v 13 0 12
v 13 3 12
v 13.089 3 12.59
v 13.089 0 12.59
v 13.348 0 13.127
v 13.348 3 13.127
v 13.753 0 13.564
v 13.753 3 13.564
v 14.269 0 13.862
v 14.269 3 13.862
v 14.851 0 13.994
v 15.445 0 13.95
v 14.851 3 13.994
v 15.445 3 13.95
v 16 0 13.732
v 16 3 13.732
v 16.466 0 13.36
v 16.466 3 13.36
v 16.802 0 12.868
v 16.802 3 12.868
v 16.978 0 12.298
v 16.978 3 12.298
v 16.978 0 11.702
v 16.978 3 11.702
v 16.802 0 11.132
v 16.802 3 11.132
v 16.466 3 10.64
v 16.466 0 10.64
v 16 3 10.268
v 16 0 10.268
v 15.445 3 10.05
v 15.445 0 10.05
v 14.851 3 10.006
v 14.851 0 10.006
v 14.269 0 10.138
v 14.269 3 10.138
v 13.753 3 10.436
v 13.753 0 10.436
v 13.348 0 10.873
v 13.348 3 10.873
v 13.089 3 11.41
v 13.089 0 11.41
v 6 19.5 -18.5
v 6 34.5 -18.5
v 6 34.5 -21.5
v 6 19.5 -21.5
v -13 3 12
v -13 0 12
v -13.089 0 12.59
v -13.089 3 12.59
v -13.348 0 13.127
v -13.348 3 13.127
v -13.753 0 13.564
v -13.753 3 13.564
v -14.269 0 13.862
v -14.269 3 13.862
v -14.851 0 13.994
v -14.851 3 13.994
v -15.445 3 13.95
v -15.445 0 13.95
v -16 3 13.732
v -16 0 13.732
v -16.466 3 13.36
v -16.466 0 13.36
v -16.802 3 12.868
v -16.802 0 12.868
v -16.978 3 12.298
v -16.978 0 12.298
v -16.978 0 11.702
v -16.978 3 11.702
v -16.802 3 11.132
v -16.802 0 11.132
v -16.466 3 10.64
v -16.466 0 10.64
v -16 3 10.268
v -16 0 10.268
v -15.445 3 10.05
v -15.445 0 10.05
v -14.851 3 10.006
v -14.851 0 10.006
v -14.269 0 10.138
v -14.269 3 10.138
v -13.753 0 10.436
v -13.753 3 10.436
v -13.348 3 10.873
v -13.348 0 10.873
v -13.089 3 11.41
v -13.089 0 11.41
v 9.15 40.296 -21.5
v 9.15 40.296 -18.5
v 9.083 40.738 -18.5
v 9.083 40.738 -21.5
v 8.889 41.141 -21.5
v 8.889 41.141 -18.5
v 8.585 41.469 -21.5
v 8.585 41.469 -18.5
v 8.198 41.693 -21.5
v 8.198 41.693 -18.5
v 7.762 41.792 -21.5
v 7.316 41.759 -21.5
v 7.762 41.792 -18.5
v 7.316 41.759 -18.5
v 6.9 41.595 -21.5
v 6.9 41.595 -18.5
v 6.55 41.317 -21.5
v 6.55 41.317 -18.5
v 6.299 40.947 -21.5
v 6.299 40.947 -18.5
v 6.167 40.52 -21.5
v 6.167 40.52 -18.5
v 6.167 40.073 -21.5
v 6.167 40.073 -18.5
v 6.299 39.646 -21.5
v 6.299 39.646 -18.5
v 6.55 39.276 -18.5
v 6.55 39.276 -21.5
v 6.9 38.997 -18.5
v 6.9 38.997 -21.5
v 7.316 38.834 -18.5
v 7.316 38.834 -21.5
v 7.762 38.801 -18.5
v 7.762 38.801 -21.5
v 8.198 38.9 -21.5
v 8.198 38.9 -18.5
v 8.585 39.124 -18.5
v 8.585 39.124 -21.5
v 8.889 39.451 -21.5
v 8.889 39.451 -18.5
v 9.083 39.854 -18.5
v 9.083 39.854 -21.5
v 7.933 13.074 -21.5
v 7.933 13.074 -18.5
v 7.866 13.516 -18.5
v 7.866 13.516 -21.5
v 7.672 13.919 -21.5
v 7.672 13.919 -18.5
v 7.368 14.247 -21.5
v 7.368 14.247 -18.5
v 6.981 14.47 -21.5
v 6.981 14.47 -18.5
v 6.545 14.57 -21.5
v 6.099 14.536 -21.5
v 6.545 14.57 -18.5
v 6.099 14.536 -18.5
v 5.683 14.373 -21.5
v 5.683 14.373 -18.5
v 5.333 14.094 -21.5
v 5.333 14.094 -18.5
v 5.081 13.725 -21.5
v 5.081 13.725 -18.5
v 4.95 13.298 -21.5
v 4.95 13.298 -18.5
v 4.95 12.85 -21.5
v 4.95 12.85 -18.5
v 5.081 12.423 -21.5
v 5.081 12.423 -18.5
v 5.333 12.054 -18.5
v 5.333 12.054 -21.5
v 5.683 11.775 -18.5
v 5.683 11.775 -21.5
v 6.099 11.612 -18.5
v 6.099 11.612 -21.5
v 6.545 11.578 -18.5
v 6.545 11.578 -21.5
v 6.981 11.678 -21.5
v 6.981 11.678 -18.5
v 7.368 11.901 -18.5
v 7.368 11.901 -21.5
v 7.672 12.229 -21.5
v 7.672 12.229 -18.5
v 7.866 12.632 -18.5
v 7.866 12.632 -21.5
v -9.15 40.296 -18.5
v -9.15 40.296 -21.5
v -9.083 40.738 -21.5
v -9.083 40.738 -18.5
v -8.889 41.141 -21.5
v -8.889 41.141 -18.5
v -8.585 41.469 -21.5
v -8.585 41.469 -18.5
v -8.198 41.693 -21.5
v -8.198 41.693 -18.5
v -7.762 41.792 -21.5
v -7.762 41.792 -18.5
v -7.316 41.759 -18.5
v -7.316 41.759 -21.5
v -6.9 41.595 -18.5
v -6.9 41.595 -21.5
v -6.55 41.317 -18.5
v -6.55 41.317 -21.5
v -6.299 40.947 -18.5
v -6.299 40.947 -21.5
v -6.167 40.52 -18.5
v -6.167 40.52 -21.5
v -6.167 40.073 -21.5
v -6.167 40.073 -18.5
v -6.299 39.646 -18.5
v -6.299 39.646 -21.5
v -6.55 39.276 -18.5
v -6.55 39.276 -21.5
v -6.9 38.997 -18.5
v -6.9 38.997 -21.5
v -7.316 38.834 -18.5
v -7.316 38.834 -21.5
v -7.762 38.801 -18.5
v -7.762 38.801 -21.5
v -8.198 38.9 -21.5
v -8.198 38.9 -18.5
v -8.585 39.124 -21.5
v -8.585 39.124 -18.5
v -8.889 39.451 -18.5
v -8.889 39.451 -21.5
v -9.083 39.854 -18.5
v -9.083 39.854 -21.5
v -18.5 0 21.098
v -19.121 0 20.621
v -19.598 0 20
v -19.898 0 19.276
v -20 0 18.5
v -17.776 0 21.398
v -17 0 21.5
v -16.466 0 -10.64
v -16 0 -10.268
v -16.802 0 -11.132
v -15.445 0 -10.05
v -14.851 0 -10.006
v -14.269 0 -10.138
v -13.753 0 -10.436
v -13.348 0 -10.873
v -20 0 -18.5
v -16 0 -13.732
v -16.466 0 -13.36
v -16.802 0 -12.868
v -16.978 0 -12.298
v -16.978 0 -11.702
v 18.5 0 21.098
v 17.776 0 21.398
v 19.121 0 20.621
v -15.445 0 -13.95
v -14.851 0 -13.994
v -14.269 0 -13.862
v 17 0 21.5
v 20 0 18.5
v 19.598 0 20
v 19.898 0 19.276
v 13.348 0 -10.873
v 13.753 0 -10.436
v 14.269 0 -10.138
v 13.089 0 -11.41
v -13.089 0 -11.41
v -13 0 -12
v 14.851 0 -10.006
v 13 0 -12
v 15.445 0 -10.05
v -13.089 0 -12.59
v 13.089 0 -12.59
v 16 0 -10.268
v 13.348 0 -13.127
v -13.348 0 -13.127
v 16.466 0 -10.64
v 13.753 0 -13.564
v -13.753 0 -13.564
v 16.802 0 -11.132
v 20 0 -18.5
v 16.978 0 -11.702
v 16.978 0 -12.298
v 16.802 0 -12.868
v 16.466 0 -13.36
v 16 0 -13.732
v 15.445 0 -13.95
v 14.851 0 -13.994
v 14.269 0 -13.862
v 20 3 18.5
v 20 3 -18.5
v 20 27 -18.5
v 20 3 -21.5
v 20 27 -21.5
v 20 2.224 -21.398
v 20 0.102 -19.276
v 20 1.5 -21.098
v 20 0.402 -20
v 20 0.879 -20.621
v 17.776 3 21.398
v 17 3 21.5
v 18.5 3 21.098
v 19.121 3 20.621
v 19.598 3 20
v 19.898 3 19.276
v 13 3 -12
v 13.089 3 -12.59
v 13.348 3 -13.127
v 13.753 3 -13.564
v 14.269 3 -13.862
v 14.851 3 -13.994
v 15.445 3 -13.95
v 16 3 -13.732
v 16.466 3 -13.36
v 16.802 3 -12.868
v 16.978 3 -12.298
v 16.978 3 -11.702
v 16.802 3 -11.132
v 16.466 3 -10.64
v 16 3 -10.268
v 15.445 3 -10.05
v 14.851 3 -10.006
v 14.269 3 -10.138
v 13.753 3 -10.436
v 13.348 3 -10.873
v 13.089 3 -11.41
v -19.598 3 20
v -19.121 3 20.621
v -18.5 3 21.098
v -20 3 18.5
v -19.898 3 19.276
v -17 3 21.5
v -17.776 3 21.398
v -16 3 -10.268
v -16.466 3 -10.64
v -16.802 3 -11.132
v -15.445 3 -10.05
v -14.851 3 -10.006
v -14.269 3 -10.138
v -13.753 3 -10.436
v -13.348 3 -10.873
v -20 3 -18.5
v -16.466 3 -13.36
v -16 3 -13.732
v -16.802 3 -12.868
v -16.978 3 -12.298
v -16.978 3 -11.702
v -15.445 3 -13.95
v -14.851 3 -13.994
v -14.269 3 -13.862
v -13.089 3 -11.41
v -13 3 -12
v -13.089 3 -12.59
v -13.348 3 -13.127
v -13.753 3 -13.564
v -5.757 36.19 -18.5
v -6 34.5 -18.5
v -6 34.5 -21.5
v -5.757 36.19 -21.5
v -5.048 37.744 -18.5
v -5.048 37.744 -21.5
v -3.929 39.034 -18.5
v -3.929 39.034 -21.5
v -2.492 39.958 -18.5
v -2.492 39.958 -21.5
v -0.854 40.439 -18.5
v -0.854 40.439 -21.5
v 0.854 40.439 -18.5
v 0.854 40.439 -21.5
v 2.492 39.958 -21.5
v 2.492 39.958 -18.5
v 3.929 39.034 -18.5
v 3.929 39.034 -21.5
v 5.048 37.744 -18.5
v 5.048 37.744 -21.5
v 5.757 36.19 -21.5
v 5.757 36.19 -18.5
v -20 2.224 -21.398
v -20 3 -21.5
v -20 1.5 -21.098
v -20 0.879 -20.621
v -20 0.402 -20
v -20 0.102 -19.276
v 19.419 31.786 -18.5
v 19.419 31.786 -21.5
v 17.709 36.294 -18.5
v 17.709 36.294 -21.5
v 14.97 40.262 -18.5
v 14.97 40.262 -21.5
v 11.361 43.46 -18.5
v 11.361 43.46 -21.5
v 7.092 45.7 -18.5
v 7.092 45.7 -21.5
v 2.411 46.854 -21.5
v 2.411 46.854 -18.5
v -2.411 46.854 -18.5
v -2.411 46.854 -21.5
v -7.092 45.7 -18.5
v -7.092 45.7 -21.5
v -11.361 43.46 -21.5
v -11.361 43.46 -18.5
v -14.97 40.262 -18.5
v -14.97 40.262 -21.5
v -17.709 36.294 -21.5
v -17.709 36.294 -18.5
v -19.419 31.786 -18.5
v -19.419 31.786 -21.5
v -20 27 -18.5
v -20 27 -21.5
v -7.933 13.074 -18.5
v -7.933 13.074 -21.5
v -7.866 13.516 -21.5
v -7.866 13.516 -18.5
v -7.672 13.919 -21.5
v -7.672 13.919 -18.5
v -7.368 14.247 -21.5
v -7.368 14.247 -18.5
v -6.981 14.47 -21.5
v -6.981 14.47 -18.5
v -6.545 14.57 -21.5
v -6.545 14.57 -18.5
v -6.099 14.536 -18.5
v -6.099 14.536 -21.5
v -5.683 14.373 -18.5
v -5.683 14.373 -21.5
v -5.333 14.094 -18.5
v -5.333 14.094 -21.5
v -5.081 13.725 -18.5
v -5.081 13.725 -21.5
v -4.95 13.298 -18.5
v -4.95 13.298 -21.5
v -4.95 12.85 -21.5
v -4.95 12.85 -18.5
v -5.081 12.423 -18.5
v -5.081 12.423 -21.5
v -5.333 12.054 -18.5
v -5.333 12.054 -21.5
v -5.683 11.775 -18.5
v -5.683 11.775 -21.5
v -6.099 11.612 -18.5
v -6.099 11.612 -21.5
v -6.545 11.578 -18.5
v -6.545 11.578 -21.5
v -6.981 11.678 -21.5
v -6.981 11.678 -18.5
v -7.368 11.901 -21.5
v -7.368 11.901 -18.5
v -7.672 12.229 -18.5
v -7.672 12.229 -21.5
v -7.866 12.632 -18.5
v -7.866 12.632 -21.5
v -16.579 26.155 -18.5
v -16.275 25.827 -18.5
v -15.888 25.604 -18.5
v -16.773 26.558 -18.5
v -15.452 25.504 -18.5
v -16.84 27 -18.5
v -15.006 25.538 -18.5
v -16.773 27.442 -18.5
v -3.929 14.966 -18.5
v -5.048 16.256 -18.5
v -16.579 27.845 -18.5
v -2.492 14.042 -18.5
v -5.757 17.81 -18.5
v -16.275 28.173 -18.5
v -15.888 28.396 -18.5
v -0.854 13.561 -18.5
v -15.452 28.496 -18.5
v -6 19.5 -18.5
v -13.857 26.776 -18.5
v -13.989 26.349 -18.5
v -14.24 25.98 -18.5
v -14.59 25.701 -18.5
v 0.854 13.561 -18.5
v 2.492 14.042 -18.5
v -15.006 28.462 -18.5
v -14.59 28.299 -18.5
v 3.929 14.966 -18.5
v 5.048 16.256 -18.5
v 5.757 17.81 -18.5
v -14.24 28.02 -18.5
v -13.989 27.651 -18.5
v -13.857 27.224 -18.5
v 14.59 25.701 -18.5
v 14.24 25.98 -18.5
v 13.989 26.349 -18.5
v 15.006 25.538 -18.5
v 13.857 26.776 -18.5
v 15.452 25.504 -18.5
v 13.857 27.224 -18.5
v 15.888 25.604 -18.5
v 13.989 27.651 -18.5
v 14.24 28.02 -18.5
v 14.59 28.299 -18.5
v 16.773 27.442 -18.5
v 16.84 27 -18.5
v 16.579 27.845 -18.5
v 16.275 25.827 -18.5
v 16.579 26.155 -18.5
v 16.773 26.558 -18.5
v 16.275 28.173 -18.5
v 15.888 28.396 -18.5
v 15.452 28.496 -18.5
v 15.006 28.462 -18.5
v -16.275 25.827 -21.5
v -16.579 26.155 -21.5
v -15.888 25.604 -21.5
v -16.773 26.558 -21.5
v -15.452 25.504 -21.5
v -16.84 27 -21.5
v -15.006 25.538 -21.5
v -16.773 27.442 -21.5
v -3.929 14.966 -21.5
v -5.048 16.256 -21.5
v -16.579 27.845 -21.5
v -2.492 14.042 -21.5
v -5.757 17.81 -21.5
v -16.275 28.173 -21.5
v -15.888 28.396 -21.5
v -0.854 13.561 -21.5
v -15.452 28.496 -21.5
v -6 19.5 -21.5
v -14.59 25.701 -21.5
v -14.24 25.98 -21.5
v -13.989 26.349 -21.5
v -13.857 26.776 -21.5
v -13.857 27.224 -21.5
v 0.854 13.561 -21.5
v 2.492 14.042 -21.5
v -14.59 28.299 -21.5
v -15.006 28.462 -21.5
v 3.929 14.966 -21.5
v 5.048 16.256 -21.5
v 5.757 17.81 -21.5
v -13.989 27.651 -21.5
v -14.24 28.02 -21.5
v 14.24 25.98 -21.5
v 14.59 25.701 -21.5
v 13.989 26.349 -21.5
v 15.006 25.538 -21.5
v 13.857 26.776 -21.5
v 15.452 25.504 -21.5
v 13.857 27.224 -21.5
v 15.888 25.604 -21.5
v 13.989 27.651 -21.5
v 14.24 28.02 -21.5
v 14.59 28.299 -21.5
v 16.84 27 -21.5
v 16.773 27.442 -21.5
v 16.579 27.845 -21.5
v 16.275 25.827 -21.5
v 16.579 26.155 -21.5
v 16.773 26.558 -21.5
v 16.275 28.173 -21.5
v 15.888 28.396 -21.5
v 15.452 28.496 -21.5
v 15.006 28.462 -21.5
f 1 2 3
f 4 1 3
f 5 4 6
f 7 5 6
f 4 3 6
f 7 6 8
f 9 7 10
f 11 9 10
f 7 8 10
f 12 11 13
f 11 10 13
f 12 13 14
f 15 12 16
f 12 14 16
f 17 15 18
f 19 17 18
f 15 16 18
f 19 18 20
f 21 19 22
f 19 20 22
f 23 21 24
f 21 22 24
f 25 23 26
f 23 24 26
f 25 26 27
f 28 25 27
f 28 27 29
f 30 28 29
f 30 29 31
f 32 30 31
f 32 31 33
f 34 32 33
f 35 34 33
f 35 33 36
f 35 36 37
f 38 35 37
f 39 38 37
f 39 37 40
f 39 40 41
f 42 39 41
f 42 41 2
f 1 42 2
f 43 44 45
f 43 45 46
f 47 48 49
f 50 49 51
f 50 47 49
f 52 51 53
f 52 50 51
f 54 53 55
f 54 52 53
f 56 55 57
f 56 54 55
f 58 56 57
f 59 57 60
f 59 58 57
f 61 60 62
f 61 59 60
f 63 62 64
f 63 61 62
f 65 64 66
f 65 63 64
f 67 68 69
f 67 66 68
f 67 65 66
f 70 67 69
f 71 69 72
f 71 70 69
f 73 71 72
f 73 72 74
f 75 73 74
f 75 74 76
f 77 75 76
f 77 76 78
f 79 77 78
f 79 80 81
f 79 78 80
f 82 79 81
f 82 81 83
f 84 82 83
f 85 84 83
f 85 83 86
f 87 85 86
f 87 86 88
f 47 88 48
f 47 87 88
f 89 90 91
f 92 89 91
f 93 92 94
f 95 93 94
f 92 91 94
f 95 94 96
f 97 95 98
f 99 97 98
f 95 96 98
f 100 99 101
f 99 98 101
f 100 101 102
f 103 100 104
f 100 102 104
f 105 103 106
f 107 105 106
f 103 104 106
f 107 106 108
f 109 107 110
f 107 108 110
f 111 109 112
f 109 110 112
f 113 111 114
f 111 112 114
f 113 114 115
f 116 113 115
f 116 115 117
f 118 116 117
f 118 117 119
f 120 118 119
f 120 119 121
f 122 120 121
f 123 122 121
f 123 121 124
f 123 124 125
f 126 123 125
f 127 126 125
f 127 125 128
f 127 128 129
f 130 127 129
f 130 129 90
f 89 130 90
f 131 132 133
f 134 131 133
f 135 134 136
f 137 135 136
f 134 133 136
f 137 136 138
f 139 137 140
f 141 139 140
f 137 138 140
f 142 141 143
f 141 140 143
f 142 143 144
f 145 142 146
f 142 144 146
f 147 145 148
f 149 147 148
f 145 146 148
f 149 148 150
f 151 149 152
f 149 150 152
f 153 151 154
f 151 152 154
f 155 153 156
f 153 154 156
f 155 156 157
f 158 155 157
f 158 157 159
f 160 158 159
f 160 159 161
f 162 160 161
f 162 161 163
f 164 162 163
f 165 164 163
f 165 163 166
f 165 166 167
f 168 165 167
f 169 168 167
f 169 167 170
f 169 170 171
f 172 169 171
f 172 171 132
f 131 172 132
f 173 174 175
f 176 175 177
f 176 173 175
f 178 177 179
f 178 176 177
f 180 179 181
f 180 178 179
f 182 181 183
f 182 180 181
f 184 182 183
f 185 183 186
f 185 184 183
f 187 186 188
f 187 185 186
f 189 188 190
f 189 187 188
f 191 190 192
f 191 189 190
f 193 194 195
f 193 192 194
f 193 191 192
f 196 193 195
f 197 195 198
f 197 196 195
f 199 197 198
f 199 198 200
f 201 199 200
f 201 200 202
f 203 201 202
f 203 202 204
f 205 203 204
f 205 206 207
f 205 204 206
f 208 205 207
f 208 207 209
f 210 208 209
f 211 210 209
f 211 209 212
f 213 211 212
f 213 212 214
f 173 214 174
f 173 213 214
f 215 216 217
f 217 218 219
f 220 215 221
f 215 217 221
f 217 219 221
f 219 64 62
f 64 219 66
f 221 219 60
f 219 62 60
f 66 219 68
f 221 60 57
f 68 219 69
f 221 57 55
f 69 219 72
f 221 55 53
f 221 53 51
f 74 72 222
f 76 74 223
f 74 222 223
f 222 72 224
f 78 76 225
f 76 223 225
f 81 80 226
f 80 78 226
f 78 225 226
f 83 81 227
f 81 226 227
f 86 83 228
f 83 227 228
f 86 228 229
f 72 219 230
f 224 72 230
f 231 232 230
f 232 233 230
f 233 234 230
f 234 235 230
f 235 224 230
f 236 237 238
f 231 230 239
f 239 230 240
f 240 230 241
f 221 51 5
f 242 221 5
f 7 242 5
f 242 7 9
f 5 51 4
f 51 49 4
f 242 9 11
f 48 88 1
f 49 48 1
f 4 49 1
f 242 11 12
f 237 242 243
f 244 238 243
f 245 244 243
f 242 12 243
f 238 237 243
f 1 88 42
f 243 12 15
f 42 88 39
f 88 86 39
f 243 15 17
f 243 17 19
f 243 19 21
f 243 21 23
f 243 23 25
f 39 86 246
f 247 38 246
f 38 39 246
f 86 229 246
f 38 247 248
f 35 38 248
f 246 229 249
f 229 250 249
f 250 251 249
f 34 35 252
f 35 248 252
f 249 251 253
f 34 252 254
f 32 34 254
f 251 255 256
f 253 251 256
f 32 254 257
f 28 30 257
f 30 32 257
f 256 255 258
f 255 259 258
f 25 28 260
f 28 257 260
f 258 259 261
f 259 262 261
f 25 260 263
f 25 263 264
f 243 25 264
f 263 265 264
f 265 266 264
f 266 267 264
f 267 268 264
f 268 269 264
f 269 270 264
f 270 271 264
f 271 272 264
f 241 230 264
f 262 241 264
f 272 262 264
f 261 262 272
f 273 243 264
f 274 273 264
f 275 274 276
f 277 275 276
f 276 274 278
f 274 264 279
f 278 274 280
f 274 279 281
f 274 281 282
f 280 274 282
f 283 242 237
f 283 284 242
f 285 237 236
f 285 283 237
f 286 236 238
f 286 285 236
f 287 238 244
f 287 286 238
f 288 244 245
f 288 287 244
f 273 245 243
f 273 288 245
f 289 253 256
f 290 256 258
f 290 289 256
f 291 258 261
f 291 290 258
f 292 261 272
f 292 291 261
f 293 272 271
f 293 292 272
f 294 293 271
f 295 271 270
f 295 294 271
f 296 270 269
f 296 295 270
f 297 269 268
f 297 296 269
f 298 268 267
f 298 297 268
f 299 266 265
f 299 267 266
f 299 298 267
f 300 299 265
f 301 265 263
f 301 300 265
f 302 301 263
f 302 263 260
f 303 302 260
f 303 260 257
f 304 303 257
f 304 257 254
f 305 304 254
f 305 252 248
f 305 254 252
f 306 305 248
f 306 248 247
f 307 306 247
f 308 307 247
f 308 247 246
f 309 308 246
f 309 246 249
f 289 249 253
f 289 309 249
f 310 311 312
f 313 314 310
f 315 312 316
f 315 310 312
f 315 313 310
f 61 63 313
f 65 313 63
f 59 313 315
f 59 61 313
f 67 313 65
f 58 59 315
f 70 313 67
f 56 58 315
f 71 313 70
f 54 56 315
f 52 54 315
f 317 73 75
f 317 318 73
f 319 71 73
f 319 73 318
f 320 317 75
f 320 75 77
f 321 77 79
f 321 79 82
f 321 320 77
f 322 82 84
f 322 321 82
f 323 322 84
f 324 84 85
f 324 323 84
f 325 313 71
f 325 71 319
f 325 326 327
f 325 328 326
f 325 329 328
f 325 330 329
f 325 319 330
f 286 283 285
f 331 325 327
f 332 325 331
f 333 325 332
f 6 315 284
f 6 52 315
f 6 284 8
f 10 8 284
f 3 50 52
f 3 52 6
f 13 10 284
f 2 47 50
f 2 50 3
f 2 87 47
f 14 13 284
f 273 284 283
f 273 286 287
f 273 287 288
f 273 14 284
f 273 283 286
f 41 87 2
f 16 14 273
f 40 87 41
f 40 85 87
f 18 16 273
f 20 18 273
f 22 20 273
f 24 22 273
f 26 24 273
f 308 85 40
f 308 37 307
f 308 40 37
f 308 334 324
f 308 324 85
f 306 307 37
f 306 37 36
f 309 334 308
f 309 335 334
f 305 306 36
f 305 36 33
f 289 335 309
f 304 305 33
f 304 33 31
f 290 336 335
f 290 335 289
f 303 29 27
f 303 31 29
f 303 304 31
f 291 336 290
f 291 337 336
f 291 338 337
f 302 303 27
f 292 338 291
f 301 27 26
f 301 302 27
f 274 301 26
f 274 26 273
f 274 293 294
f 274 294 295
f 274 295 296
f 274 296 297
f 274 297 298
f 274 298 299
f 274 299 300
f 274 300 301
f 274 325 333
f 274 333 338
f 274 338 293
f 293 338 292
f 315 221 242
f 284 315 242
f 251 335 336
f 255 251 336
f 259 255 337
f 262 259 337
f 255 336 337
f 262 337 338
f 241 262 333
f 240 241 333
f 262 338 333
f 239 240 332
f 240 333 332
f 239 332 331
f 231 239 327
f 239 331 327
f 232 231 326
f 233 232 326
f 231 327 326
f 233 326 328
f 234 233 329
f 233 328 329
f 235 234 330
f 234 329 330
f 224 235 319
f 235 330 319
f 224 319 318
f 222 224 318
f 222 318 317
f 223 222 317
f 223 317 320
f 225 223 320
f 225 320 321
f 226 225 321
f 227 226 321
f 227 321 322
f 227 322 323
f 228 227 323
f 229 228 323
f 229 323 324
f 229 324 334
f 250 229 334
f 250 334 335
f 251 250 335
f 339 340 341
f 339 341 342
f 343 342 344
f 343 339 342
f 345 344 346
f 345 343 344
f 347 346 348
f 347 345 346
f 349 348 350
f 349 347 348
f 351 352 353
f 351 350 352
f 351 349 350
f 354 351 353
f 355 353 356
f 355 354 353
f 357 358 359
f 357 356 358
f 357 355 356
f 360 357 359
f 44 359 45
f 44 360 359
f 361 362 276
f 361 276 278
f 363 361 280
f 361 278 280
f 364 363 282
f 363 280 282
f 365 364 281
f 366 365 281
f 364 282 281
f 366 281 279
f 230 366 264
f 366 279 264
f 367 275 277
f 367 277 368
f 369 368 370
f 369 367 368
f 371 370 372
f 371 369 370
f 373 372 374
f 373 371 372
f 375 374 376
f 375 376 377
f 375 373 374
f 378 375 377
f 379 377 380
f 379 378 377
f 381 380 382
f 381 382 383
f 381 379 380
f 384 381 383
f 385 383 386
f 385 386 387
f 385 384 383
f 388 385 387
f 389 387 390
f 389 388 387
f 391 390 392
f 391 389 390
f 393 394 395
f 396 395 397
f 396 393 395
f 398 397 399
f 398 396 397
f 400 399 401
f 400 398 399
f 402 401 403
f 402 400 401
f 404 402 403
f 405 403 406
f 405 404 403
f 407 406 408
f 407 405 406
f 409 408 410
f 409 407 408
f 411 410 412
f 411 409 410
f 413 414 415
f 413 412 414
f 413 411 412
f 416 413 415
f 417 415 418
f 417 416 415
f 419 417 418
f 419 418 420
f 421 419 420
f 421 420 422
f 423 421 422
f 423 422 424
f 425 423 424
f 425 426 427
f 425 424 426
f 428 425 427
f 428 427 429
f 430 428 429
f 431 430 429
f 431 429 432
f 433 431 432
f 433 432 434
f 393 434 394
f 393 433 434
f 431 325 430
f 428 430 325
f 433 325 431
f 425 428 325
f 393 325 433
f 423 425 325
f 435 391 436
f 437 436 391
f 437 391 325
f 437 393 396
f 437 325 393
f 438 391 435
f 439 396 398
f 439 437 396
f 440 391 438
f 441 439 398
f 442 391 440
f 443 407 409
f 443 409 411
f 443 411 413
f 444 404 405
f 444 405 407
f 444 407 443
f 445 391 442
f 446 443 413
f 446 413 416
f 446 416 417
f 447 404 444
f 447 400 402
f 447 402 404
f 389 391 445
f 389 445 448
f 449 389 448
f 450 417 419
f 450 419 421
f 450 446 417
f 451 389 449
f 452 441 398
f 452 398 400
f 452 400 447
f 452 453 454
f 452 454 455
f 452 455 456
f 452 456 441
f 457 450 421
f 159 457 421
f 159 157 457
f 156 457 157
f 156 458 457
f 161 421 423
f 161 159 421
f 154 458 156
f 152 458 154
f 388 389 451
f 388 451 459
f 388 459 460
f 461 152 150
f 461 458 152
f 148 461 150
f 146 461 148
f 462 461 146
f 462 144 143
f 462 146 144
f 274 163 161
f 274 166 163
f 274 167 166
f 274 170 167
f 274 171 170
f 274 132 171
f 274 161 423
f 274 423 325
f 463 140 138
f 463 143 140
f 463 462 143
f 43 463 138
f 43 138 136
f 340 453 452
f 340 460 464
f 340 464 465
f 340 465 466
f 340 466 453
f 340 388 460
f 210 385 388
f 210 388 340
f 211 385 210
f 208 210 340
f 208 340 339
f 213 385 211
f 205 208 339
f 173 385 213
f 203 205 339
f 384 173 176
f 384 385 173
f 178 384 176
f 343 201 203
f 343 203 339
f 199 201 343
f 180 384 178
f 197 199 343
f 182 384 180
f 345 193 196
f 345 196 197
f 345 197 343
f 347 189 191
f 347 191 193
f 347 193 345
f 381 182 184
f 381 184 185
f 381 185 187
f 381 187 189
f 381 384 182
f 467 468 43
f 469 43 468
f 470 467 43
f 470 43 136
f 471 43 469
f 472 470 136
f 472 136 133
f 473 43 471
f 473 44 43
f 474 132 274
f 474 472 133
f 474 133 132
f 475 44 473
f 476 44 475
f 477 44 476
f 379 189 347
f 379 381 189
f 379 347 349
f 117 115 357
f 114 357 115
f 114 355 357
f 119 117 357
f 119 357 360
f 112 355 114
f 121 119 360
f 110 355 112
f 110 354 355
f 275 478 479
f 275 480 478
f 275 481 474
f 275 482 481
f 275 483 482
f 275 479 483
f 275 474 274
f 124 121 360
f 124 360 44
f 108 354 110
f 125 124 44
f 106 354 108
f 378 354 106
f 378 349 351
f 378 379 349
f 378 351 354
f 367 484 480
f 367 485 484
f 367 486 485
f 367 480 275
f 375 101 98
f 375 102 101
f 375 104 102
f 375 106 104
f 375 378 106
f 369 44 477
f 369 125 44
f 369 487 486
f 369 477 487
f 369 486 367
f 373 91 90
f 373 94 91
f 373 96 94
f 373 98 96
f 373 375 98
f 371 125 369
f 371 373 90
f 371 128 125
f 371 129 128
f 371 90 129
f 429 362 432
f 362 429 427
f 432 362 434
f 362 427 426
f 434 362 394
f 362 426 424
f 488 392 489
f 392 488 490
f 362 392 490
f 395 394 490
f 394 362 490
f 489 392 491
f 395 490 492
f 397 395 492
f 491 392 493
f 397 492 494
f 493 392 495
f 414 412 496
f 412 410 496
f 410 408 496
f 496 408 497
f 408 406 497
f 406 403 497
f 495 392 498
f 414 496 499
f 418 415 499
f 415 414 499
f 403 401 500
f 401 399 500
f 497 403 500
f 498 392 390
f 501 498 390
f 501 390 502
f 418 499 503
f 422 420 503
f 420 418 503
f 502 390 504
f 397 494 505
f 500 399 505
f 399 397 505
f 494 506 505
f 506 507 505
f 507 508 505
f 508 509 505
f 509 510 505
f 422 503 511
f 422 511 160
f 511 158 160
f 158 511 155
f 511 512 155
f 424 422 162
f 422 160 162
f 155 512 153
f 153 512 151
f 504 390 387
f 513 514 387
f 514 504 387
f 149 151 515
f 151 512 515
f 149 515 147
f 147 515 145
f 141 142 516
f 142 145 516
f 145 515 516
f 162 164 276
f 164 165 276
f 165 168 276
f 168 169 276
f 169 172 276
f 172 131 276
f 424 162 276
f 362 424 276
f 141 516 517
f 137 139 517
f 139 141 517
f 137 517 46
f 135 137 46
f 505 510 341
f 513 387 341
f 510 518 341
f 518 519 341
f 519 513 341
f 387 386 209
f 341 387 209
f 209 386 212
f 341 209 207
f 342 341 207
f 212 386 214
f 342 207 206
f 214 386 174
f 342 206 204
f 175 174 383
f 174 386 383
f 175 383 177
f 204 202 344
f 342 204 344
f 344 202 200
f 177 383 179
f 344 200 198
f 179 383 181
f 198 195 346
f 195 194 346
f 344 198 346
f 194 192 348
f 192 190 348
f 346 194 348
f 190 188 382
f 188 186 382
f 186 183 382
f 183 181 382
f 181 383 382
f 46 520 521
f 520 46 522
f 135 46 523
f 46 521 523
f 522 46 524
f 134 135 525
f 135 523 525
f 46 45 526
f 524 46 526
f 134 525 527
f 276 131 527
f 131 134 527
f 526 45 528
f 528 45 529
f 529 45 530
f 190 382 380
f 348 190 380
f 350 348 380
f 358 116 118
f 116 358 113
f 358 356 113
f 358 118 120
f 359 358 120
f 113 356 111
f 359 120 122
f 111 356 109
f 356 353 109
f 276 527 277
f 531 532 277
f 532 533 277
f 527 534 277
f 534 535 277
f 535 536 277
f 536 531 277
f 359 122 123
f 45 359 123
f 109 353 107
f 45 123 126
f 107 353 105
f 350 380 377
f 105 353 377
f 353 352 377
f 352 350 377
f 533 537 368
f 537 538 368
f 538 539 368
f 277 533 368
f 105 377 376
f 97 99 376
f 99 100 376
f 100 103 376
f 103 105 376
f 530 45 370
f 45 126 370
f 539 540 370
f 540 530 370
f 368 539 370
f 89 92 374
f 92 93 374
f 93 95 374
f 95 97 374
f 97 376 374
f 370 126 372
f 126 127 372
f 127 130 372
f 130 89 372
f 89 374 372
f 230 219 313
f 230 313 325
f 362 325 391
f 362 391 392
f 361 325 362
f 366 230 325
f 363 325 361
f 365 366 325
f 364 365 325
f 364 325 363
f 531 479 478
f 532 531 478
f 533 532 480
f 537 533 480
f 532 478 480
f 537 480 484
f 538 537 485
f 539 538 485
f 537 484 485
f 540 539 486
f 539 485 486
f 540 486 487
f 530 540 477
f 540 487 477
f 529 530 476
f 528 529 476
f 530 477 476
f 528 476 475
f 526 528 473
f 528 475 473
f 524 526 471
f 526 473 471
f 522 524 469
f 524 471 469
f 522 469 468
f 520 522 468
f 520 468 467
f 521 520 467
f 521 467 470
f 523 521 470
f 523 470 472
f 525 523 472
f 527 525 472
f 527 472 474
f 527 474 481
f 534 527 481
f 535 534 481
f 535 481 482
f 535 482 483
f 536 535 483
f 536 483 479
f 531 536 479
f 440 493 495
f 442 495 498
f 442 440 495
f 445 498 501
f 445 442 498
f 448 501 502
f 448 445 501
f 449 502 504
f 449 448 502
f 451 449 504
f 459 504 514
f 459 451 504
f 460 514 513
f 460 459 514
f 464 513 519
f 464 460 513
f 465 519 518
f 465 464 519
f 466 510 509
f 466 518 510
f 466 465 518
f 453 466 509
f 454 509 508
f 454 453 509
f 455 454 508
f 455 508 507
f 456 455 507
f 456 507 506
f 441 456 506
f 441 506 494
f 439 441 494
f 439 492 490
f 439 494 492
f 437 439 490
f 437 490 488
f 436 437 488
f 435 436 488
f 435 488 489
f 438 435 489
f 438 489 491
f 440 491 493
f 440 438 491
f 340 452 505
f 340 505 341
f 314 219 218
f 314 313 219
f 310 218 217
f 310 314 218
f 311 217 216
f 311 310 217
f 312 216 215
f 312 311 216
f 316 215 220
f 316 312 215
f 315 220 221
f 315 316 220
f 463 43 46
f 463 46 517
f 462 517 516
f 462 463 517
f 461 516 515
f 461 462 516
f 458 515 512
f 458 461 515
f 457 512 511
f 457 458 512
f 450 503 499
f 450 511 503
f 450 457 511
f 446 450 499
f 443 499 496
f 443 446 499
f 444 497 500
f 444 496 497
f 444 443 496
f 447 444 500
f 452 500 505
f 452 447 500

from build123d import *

# Parameters (mm, degrees)
SKETCH3_W               = 40
SKETCH3_H               = 43
BOSS_EXTRUDE1_DEPTH     = 3
SKETCH4_W               = 40
SKETCH4_H               = 3
BOSS_EXTRUDE2_DEPTH     = 24
SKETCH6_R               = 20
BOSS_EXTRUDE3_DEPTH     = 3
SKETCH7_R               = 1.5
CUT_EXTRUDE1_DEPTH      = 8
FILLET1_R               = 3
SKETCH8_R               = 2
CUT_EXTRUDE2_DEPTH      = 8
MIRROR3_COPY_1_SKETCH_R = 2
MIRROR3_COPY_1_DEPTH    = 8
FILLET2_R               = 3
CUT_EXTRUDE3_DEPTH      = 8


with BuildPart() as part:
    # Sketch3 → Boss-Extrude1 (new body)
    with BuildSketch(Plane(origin=(0, 0, 0), x_dir=(1, 0, 0), z_dir=(0, 1, 0))):
        Rectangle(SKETCH3_W, SKETCH3_H)
    extrude(amount=BOSS_EXTRUDE1_DEPTH)

    # Sketch4 → Boss-Extrude2 (add)
    with BuildSketch(Plane(origin=(0, 3, 0), x_dir=(1, 0, 0), z_dir=(0, 1, 0))):
        with Locations((0, 20)):
            Rectangle(SKETCH4_W, SKETCH4_H)
    extrude(amount=BOSS_EXTRUDE2_DEPTH)

    # Sketch6 → Boss-Extrude3 (add)
    with BuildSketch(Plane.XY.offset(-18.5)):
        with Locations((0, 27)):
            Circle(SKETCH6_R)
    extrude(amount=-BOSS_EXTRUDE3_DEPTH)

    # Sketch7 → Cut-Extrude1 (cut)
    with BuildSketch(Plane.XY.offset(-18.5)):
        with Locations((7.65, 40.296356644)):
            Circle(SKETCH7_R)
        with Locations((15.34, 27)):
            Circle(SKETCH7_R)
        with Locations((6.432903226, 13.074004305)):
            Circle(SKETCH7_R)
    cut_extrude1 = extrude(amount=-CUT_EXTRUDE1_DEPTH, mode=Mode.SUBTRACT)

    # Mirror1: Cut-Extrude1 across plane
    add(cut_extrude1.mirror(Plane(origin=(0, 0, 0), x_dir=(0, 0, 1), z_dir=(1, 0, 0))), mode=Mode.SUBTRACT)

    # Fillet1
    fillet1_edges = [part.edges().sort_by_distance(p)[0] for p in [
        (0, 0, -21.5),
    ]]
    fillet(fillet1_edges, radius=FILLET1_R)

    # Sketch8 → Cut-Extrude2 (cut)
    with BuildSketch(Plane(origin=(0, 3, 0), x_dir=(1, 0, 0), z_dir=(0, 1, 0))):
        with Locations((-15, 12)):
            Circle(SKETCH8_R)
    cut_extrude2 = extrude(amount=-CUT_EXTRUDE2_DEPTH, mode=Mode.SUBTRACT)

    # Mirror2: Cut-Extrude2 across plane
    add(cut_extrude2.mirror(Plane(origin=(0, 0, 0), x_dir=(0, 0, 1), z_dir=(1, 0, 0))), mode=Mode.SUBTRACT)

    # Mirror3: Cut-Extrude2 across plane
    add(cut_extrude2.mirror(Plane.XY), mode=Mode.SUBTRACT)

    # Mirror3 copy 1 sketch → Mirror3 copy 1 (cut)
    with BuildSketch(Plane(origin=(0, 3, 0), x_dir=(-1, 0, 0), z_dir=(0, 1, 0))):
        with Locations((-15, 12)):
            Circle(MIRROR3_COPY_1_SKETCH_R)
    extrude(amount=-MIRROR3_COPY_1_DEPTH, mode=Mode.SUBTRACT)

    # Fillet2
    fillet2_edges = [part.edges().sort_by_distance(p)[0] for p in [
        (20, 1.5, 21.5),
        (-20, 1.5, 21.5),
    ]]
    fillet(fillet2_edges, radius=FILLET2_R)

    # Sketch9 → Cut-Extrude3 (cut)
    with BuildSketch(Plane.XY.offset(-18.5)):
        with BuildLine():
            Line((6, 34.5), (6, 19.5))
            ThreePointArc((6, 19.5), (0, 13.5), (-6, 19.5))
            Line((-6, 19.5), (-6, 34.5))
            ThreePointArc((-6, 34.5), (0, 40.5), (6, 34.5))
        make_face()
    extrude(amount=-CUT_EXTRUDE3_DEPTH, mode=Mode.SUBTRACT)


solid = part.part
